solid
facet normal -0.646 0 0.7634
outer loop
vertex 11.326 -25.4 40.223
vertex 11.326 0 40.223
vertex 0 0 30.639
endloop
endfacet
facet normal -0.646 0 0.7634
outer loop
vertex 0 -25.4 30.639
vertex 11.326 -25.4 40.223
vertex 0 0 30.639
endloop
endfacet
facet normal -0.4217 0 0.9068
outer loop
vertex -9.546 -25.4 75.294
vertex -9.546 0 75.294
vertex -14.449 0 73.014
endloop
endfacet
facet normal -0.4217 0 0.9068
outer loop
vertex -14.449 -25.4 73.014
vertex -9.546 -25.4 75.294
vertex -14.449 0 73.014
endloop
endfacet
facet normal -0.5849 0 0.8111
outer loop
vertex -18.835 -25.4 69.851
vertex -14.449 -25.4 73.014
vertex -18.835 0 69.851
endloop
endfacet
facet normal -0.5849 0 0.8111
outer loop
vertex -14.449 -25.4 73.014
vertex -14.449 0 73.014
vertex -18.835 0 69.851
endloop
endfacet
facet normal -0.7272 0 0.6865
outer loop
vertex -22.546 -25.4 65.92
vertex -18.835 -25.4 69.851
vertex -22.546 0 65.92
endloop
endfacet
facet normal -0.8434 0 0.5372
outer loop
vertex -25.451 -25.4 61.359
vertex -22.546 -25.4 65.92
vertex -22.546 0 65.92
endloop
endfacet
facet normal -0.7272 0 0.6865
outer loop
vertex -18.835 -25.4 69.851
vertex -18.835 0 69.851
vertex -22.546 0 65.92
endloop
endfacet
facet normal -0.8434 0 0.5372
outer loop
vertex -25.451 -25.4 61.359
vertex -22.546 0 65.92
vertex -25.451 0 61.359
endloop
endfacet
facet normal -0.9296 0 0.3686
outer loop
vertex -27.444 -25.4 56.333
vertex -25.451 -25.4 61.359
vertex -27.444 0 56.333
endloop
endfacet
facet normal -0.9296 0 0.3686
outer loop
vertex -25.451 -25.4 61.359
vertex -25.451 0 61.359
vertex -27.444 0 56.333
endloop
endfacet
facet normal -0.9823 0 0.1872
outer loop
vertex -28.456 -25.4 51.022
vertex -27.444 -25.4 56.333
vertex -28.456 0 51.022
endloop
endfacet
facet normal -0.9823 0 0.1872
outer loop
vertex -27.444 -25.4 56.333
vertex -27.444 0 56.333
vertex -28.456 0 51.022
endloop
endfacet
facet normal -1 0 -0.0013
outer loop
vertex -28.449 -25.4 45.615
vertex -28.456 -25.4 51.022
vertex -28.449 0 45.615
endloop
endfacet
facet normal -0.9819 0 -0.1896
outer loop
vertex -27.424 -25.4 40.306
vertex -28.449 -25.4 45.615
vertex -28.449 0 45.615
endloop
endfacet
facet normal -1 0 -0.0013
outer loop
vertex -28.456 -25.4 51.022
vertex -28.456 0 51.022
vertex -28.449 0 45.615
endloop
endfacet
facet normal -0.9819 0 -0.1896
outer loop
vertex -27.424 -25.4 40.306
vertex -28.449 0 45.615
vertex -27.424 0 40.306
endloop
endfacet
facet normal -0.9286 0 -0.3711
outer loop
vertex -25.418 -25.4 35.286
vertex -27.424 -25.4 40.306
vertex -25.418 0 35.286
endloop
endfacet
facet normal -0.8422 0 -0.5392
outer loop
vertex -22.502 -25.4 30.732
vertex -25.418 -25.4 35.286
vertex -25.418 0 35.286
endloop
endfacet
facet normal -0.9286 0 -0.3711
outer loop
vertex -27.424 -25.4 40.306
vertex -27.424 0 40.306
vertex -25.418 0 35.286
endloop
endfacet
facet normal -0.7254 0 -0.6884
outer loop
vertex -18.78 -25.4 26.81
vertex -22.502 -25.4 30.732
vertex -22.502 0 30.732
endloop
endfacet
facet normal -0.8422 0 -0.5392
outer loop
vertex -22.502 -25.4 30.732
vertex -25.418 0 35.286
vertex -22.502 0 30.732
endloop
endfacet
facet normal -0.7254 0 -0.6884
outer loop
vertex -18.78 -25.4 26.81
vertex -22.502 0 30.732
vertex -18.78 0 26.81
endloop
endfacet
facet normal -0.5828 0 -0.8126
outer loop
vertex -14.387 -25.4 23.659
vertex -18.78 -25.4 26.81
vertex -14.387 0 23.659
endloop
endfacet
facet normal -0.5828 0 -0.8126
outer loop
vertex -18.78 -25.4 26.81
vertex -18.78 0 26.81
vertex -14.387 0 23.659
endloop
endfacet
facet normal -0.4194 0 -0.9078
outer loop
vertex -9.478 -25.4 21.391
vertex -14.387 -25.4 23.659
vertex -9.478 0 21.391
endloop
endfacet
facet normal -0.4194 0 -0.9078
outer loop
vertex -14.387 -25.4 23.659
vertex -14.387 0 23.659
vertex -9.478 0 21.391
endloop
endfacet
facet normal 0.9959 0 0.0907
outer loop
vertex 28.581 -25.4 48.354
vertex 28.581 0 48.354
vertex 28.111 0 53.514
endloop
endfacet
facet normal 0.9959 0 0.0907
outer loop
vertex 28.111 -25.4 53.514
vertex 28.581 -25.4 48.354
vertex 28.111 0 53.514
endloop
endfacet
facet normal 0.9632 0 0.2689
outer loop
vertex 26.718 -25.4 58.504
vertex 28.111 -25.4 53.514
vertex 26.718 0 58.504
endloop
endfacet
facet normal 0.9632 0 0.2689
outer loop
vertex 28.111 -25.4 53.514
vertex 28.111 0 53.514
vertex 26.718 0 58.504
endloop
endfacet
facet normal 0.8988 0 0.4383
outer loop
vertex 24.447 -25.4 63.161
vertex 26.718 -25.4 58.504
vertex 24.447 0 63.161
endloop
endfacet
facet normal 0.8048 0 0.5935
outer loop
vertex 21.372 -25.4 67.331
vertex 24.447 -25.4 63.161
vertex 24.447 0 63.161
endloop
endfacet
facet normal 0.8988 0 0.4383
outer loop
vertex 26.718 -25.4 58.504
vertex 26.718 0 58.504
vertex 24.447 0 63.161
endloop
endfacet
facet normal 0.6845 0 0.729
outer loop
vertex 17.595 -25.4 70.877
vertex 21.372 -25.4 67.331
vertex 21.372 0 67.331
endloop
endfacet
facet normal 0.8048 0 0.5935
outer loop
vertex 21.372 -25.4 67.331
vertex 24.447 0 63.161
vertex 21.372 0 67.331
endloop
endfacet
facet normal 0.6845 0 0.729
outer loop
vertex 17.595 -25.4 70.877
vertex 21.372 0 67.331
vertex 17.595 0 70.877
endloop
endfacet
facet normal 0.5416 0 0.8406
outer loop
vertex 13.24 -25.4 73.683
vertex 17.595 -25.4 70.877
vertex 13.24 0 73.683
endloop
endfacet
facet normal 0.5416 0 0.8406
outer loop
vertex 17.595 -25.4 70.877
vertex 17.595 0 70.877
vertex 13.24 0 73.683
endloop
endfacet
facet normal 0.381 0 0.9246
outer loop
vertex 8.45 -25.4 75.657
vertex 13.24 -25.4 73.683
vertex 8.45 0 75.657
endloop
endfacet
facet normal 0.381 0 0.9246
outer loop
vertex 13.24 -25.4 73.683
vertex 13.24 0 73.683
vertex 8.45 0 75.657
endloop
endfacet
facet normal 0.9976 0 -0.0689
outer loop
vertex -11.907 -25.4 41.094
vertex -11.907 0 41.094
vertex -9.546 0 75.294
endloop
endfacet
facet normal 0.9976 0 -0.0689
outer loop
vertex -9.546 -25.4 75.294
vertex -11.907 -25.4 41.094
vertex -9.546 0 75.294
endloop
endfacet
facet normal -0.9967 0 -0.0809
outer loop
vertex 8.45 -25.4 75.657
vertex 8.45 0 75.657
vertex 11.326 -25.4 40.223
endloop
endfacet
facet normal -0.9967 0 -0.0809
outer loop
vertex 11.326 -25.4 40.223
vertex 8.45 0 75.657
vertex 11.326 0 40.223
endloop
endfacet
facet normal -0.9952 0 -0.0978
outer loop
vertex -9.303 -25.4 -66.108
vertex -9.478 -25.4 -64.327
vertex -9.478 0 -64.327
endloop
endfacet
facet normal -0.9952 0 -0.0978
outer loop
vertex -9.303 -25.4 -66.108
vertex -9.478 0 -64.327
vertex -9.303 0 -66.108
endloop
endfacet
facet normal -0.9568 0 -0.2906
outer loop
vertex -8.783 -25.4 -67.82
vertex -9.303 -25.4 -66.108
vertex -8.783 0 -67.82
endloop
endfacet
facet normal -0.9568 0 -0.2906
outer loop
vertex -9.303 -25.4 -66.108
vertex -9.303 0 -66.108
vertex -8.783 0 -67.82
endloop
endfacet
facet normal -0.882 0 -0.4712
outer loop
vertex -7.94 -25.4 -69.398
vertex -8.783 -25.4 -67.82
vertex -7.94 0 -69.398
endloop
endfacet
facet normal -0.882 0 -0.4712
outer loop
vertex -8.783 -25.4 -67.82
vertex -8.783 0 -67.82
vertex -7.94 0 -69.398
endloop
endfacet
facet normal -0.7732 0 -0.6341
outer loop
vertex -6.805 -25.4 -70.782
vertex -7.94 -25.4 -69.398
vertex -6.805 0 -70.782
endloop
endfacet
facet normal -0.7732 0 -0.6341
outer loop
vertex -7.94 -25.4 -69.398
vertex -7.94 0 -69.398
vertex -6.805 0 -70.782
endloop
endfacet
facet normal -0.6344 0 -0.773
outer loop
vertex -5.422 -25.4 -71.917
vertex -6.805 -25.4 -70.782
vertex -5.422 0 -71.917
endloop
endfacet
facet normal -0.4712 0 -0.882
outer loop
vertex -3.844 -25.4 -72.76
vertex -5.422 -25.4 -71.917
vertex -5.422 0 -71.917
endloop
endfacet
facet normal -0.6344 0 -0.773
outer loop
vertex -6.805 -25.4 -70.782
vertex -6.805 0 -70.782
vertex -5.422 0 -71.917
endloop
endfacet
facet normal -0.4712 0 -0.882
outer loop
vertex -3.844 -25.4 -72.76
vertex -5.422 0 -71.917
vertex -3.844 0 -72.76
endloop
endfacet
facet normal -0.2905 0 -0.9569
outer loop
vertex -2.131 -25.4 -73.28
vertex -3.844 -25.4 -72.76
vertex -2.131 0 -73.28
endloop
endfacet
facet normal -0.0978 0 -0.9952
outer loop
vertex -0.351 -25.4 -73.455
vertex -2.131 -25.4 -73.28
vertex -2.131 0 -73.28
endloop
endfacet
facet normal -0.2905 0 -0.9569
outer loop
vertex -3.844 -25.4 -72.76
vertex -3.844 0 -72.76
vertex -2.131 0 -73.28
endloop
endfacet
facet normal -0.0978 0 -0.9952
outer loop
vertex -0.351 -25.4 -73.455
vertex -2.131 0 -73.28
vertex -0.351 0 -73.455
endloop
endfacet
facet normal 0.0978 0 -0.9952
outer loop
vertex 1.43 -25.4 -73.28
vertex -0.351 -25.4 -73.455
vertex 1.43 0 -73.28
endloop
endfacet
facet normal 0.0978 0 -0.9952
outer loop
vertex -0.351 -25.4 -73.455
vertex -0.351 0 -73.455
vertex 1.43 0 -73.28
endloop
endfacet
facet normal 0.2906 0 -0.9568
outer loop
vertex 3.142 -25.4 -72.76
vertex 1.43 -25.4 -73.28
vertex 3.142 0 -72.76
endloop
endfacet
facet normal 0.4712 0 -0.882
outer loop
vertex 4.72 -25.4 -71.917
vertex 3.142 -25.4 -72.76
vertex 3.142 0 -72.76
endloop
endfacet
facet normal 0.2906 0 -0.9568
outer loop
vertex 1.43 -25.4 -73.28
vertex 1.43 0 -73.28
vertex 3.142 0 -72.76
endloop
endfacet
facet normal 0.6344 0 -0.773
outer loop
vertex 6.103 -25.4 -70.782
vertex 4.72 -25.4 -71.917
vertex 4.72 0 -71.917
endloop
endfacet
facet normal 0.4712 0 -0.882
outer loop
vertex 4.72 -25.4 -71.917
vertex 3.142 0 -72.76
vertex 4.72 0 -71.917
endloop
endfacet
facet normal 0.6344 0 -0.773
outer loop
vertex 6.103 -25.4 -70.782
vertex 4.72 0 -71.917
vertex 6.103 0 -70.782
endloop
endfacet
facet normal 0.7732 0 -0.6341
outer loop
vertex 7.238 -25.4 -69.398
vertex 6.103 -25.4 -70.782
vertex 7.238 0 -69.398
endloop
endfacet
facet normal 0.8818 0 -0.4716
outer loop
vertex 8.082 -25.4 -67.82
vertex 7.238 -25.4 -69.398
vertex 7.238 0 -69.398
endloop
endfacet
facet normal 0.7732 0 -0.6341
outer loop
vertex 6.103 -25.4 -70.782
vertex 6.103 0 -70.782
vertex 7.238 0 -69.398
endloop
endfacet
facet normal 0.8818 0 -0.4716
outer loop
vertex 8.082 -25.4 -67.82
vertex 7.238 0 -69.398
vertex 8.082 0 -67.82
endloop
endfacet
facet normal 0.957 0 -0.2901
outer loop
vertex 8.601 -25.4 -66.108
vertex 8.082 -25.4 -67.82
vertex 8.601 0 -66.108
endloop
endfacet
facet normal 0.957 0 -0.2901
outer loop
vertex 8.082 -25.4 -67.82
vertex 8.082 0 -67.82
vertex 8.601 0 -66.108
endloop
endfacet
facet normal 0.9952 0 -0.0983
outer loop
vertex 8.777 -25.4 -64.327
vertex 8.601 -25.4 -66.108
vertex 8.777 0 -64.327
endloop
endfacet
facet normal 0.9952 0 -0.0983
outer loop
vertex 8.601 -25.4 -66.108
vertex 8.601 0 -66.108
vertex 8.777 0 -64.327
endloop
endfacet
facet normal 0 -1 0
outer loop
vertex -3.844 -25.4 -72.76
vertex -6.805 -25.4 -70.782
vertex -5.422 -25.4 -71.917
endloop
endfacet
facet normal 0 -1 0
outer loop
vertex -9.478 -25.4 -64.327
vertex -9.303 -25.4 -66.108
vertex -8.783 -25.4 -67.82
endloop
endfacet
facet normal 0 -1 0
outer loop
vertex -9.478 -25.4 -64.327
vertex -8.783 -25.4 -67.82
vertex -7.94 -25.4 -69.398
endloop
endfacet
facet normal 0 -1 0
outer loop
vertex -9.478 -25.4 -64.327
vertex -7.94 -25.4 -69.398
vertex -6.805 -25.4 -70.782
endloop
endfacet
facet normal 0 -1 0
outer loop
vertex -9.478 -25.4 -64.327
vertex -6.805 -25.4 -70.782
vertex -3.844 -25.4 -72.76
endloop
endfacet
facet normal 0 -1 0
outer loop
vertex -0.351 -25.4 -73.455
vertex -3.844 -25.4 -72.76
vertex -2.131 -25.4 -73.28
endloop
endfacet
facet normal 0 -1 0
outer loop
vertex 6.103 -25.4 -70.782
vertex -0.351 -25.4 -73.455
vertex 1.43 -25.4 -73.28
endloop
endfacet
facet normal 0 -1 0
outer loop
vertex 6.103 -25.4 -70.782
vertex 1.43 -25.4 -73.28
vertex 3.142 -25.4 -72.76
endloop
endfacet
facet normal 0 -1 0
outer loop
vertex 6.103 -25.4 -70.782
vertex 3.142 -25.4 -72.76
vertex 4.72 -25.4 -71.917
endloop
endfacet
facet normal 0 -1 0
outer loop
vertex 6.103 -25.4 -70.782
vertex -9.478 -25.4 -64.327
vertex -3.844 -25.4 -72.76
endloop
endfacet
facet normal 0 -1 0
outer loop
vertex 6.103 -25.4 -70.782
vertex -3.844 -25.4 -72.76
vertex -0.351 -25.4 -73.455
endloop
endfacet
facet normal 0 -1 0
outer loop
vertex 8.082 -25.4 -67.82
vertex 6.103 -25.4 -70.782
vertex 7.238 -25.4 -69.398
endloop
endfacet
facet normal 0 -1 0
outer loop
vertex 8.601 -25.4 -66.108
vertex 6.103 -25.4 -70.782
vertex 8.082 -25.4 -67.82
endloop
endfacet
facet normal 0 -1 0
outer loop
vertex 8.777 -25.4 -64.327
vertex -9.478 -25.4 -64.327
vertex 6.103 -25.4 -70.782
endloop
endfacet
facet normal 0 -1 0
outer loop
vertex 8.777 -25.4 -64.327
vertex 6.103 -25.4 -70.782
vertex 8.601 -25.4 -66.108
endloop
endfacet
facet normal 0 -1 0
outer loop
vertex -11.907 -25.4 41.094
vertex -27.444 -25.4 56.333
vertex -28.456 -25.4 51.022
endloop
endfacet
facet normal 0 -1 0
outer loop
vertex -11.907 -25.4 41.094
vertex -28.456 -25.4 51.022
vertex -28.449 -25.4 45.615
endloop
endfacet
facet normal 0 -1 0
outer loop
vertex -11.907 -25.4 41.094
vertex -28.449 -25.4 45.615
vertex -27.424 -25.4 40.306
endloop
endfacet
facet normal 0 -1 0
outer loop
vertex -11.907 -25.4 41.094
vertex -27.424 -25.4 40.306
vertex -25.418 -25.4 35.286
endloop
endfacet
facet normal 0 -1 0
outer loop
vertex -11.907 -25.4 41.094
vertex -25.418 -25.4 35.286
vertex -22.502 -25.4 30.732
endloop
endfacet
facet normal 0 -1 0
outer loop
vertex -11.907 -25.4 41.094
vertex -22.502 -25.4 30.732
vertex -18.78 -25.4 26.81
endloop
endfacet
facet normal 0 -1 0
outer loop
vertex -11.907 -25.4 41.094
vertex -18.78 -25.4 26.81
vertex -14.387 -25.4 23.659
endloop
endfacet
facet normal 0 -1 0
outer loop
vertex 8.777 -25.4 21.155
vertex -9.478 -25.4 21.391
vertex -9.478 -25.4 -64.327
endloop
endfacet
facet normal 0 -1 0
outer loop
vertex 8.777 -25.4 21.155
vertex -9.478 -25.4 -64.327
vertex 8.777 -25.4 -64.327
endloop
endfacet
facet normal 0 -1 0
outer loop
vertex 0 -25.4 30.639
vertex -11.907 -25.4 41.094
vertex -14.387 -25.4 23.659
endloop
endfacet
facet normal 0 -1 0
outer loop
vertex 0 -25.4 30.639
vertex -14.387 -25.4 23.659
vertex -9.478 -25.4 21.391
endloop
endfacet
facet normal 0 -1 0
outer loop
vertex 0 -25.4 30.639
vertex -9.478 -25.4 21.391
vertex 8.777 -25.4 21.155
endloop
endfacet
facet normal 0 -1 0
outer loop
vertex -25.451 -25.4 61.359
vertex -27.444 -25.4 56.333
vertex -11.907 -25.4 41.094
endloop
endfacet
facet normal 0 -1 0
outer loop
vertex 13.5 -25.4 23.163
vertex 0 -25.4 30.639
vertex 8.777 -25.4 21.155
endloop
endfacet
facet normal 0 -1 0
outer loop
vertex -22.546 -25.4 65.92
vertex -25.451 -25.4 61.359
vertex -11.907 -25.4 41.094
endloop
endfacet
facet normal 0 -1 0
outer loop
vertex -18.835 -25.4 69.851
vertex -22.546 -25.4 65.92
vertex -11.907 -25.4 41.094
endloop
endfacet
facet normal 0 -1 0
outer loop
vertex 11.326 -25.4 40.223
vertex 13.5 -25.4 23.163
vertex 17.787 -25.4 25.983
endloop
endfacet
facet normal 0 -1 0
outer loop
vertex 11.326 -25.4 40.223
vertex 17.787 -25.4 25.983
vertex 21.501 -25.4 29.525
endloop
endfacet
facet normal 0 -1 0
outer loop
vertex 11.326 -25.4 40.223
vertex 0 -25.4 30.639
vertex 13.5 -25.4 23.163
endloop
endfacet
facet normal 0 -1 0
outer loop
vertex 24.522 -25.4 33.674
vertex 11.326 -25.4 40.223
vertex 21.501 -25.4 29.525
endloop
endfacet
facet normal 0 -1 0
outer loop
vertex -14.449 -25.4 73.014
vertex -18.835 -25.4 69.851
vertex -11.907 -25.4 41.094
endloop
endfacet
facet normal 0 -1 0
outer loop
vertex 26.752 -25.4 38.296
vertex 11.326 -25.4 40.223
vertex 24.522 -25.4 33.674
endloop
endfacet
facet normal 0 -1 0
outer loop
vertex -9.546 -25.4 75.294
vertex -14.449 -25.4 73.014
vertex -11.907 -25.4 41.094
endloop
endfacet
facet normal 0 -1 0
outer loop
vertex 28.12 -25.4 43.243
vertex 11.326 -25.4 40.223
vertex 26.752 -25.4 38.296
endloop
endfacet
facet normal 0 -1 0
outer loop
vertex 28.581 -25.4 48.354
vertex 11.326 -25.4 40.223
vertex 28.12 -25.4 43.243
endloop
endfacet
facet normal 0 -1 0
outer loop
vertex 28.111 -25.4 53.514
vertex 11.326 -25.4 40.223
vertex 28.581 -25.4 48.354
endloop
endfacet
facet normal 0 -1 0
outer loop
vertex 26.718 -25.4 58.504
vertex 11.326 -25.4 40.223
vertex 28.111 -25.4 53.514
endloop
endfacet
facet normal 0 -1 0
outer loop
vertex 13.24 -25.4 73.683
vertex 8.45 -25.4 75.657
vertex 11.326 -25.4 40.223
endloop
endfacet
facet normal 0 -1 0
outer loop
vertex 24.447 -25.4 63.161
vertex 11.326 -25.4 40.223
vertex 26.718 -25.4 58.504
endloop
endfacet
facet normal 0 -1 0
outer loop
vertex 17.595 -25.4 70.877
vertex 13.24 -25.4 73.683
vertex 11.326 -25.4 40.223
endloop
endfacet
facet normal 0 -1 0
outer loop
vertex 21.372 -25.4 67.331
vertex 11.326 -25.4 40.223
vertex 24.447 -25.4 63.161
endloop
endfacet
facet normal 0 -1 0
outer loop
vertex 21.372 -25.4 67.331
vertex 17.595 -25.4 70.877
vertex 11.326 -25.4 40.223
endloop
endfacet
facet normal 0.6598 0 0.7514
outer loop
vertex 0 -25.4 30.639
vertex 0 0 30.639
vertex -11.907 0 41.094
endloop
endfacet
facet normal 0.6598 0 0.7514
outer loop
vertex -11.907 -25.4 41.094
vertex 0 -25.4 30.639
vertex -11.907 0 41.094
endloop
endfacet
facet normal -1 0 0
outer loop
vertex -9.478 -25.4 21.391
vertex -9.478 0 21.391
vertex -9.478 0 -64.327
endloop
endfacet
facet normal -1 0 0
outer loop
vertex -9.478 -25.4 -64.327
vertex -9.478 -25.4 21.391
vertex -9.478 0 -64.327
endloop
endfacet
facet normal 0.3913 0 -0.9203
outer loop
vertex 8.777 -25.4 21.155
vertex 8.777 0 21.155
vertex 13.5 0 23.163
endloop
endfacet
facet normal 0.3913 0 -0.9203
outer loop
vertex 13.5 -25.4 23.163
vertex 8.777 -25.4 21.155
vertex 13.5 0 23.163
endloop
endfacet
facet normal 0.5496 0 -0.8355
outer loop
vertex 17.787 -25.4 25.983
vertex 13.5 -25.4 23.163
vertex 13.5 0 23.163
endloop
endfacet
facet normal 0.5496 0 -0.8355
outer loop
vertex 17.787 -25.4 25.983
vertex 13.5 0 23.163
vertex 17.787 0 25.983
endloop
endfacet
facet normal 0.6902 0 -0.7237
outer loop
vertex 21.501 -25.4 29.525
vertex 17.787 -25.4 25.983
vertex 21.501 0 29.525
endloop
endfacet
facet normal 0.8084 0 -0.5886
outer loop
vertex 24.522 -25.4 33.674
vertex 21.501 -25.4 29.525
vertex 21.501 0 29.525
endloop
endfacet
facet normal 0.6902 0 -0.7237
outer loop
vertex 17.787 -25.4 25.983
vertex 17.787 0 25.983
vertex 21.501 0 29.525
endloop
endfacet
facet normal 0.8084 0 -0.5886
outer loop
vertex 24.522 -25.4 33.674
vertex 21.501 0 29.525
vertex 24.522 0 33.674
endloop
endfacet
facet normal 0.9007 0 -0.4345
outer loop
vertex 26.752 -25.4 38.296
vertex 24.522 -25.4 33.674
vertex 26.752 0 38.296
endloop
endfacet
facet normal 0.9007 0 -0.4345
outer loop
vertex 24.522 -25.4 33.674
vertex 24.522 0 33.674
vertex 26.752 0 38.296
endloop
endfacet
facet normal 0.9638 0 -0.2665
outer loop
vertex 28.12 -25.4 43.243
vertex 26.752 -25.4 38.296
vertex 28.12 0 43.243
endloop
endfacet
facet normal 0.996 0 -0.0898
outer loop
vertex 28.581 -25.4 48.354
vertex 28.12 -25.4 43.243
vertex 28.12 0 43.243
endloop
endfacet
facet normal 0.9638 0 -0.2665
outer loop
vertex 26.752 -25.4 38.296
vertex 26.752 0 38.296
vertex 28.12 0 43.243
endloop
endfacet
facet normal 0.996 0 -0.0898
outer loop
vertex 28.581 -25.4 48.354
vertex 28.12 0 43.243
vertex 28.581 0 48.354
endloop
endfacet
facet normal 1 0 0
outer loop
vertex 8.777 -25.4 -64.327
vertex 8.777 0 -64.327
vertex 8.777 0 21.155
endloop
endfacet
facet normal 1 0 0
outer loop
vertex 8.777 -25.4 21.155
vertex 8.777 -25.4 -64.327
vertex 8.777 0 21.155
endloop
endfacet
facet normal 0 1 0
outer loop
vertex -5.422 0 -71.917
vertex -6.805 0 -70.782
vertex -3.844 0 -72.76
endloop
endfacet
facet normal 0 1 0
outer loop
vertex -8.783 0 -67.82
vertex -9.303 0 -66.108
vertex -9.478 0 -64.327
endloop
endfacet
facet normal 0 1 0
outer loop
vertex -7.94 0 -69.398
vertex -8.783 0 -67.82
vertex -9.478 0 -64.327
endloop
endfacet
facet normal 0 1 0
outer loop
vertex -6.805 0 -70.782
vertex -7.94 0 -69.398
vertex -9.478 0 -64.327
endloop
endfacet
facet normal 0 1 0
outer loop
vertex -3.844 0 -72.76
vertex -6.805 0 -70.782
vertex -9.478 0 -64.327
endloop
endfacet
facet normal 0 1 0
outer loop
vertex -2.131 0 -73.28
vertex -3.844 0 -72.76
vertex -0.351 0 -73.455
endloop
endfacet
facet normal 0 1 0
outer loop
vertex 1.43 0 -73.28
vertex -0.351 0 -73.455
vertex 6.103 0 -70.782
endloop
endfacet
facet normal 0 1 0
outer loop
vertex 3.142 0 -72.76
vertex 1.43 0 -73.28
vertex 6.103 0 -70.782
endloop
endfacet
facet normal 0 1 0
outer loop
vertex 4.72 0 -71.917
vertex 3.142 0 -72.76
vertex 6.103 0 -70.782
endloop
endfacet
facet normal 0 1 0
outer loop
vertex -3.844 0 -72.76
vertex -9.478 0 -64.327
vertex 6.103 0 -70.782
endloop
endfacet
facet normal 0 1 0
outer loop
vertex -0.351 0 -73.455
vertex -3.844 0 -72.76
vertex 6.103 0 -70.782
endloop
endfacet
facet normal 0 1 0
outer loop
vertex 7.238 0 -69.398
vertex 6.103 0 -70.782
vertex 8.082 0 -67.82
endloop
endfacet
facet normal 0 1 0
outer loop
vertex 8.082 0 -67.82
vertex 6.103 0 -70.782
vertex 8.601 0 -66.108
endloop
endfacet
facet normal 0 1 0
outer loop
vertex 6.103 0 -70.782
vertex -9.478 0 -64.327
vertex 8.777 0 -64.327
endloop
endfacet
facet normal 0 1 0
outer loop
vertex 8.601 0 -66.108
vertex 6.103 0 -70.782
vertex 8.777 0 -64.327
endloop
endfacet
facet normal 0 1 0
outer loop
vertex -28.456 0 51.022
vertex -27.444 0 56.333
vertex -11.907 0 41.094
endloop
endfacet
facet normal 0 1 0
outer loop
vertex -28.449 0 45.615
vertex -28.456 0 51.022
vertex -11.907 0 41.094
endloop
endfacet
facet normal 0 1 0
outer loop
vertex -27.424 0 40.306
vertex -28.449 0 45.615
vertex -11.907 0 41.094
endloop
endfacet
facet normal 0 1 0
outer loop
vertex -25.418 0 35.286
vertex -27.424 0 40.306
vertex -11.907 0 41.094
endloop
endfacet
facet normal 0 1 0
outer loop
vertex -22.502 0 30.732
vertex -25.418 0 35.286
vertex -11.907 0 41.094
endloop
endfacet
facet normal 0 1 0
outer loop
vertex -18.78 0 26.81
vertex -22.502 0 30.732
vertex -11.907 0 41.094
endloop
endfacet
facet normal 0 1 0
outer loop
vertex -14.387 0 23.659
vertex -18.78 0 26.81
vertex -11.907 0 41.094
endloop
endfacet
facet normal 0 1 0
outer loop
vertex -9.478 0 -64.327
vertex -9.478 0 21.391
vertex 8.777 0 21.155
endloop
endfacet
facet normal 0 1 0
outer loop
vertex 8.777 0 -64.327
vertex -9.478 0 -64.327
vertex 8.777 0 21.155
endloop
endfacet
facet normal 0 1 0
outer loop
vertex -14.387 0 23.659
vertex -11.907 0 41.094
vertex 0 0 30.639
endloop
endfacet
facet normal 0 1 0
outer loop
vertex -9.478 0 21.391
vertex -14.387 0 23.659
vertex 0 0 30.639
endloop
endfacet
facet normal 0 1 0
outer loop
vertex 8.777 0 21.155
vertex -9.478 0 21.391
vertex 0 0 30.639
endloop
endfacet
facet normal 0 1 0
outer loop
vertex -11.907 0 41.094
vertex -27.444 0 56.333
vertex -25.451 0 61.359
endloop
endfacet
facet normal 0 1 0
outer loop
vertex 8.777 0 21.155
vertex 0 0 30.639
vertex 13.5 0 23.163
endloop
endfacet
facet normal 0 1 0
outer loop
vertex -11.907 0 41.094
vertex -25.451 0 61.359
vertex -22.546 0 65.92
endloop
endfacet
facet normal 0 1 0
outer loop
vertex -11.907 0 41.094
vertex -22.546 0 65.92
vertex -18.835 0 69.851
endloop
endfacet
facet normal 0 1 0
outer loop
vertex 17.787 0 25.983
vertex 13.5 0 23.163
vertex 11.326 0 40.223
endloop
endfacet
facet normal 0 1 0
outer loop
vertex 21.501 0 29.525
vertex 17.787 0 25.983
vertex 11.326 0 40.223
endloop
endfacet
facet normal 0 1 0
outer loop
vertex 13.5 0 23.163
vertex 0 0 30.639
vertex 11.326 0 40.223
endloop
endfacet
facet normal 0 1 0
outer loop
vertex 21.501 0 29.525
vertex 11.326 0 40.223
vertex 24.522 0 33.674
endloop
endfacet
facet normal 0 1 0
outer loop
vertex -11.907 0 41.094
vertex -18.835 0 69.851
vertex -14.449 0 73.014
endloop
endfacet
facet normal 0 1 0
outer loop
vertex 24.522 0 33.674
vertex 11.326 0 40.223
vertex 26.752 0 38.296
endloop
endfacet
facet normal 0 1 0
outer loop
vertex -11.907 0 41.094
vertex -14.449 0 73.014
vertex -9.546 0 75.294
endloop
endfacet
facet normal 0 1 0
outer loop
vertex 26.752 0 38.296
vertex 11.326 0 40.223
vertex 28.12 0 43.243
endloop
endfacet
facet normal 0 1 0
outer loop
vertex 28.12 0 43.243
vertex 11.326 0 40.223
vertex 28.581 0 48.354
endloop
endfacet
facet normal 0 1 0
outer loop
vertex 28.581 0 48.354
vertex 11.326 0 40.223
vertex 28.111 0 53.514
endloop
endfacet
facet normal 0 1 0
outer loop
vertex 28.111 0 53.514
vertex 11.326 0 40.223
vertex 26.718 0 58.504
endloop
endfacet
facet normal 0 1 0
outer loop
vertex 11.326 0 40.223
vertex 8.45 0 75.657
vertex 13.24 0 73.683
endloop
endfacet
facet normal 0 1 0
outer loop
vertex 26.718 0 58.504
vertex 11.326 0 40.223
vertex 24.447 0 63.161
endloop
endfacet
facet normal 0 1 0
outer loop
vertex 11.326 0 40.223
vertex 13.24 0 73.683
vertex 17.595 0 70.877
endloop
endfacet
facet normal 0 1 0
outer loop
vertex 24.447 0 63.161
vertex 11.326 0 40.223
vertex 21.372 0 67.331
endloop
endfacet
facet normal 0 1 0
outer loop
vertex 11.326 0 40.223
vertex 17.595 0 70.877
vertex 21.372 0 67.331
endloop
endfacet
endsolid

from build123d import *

# Parameters (mm, degrees)
F1_DEPTH = 25.4


with BuildPart() as f1:
    # F0 (on Front) → F1 (new body)
    with BuildSketch(Plane.XZ):
        with BuildLine():
            ThreePointArc((8.776649, 21.15477), (23.105166, 31.531712), (28.580673, 48.354499))
            ThreePointArc((28.580673, 48.354499), (23.003939, 65.315443), (8.450032, 75.657462))
            Line((8.450032, 75.657462), (11.326279, 40.222812))
            Line((11.326279, 40.222812), (0, 30.639039))
            Line((0, 30.639039), (-11.907114, 41.094065))
            Line((-11.907114, 41.094065), (-9.546468, 75.293686))
            ThreePointArc((-9.546468, 75.293686), (-28.58065, 48.318335), (-9.478263, 21.391239))
            ThreePointArc((-9.478263, 21.391239), (-0.370196, 19.776224), (8.776649, 21.15477))
        make_face()
        with BuildLine():
            Line((8.776649, -64.327464), (8.776649, 21.15477))
            ThreePointArc((8.776649, 21.15477), (-0.370196, 19.776224), (-9.478263, 21.391239))
            Line((-9.478263, 21.391239), (-9.478263, -64.327464))
            ThreePointArc((-9.478263, -64.327464), (-0.350807, -73.45492), (8.776649, -64.327464))
        make_face()
    extrude(amount=F1_DEPTH)


solid = f1.part
